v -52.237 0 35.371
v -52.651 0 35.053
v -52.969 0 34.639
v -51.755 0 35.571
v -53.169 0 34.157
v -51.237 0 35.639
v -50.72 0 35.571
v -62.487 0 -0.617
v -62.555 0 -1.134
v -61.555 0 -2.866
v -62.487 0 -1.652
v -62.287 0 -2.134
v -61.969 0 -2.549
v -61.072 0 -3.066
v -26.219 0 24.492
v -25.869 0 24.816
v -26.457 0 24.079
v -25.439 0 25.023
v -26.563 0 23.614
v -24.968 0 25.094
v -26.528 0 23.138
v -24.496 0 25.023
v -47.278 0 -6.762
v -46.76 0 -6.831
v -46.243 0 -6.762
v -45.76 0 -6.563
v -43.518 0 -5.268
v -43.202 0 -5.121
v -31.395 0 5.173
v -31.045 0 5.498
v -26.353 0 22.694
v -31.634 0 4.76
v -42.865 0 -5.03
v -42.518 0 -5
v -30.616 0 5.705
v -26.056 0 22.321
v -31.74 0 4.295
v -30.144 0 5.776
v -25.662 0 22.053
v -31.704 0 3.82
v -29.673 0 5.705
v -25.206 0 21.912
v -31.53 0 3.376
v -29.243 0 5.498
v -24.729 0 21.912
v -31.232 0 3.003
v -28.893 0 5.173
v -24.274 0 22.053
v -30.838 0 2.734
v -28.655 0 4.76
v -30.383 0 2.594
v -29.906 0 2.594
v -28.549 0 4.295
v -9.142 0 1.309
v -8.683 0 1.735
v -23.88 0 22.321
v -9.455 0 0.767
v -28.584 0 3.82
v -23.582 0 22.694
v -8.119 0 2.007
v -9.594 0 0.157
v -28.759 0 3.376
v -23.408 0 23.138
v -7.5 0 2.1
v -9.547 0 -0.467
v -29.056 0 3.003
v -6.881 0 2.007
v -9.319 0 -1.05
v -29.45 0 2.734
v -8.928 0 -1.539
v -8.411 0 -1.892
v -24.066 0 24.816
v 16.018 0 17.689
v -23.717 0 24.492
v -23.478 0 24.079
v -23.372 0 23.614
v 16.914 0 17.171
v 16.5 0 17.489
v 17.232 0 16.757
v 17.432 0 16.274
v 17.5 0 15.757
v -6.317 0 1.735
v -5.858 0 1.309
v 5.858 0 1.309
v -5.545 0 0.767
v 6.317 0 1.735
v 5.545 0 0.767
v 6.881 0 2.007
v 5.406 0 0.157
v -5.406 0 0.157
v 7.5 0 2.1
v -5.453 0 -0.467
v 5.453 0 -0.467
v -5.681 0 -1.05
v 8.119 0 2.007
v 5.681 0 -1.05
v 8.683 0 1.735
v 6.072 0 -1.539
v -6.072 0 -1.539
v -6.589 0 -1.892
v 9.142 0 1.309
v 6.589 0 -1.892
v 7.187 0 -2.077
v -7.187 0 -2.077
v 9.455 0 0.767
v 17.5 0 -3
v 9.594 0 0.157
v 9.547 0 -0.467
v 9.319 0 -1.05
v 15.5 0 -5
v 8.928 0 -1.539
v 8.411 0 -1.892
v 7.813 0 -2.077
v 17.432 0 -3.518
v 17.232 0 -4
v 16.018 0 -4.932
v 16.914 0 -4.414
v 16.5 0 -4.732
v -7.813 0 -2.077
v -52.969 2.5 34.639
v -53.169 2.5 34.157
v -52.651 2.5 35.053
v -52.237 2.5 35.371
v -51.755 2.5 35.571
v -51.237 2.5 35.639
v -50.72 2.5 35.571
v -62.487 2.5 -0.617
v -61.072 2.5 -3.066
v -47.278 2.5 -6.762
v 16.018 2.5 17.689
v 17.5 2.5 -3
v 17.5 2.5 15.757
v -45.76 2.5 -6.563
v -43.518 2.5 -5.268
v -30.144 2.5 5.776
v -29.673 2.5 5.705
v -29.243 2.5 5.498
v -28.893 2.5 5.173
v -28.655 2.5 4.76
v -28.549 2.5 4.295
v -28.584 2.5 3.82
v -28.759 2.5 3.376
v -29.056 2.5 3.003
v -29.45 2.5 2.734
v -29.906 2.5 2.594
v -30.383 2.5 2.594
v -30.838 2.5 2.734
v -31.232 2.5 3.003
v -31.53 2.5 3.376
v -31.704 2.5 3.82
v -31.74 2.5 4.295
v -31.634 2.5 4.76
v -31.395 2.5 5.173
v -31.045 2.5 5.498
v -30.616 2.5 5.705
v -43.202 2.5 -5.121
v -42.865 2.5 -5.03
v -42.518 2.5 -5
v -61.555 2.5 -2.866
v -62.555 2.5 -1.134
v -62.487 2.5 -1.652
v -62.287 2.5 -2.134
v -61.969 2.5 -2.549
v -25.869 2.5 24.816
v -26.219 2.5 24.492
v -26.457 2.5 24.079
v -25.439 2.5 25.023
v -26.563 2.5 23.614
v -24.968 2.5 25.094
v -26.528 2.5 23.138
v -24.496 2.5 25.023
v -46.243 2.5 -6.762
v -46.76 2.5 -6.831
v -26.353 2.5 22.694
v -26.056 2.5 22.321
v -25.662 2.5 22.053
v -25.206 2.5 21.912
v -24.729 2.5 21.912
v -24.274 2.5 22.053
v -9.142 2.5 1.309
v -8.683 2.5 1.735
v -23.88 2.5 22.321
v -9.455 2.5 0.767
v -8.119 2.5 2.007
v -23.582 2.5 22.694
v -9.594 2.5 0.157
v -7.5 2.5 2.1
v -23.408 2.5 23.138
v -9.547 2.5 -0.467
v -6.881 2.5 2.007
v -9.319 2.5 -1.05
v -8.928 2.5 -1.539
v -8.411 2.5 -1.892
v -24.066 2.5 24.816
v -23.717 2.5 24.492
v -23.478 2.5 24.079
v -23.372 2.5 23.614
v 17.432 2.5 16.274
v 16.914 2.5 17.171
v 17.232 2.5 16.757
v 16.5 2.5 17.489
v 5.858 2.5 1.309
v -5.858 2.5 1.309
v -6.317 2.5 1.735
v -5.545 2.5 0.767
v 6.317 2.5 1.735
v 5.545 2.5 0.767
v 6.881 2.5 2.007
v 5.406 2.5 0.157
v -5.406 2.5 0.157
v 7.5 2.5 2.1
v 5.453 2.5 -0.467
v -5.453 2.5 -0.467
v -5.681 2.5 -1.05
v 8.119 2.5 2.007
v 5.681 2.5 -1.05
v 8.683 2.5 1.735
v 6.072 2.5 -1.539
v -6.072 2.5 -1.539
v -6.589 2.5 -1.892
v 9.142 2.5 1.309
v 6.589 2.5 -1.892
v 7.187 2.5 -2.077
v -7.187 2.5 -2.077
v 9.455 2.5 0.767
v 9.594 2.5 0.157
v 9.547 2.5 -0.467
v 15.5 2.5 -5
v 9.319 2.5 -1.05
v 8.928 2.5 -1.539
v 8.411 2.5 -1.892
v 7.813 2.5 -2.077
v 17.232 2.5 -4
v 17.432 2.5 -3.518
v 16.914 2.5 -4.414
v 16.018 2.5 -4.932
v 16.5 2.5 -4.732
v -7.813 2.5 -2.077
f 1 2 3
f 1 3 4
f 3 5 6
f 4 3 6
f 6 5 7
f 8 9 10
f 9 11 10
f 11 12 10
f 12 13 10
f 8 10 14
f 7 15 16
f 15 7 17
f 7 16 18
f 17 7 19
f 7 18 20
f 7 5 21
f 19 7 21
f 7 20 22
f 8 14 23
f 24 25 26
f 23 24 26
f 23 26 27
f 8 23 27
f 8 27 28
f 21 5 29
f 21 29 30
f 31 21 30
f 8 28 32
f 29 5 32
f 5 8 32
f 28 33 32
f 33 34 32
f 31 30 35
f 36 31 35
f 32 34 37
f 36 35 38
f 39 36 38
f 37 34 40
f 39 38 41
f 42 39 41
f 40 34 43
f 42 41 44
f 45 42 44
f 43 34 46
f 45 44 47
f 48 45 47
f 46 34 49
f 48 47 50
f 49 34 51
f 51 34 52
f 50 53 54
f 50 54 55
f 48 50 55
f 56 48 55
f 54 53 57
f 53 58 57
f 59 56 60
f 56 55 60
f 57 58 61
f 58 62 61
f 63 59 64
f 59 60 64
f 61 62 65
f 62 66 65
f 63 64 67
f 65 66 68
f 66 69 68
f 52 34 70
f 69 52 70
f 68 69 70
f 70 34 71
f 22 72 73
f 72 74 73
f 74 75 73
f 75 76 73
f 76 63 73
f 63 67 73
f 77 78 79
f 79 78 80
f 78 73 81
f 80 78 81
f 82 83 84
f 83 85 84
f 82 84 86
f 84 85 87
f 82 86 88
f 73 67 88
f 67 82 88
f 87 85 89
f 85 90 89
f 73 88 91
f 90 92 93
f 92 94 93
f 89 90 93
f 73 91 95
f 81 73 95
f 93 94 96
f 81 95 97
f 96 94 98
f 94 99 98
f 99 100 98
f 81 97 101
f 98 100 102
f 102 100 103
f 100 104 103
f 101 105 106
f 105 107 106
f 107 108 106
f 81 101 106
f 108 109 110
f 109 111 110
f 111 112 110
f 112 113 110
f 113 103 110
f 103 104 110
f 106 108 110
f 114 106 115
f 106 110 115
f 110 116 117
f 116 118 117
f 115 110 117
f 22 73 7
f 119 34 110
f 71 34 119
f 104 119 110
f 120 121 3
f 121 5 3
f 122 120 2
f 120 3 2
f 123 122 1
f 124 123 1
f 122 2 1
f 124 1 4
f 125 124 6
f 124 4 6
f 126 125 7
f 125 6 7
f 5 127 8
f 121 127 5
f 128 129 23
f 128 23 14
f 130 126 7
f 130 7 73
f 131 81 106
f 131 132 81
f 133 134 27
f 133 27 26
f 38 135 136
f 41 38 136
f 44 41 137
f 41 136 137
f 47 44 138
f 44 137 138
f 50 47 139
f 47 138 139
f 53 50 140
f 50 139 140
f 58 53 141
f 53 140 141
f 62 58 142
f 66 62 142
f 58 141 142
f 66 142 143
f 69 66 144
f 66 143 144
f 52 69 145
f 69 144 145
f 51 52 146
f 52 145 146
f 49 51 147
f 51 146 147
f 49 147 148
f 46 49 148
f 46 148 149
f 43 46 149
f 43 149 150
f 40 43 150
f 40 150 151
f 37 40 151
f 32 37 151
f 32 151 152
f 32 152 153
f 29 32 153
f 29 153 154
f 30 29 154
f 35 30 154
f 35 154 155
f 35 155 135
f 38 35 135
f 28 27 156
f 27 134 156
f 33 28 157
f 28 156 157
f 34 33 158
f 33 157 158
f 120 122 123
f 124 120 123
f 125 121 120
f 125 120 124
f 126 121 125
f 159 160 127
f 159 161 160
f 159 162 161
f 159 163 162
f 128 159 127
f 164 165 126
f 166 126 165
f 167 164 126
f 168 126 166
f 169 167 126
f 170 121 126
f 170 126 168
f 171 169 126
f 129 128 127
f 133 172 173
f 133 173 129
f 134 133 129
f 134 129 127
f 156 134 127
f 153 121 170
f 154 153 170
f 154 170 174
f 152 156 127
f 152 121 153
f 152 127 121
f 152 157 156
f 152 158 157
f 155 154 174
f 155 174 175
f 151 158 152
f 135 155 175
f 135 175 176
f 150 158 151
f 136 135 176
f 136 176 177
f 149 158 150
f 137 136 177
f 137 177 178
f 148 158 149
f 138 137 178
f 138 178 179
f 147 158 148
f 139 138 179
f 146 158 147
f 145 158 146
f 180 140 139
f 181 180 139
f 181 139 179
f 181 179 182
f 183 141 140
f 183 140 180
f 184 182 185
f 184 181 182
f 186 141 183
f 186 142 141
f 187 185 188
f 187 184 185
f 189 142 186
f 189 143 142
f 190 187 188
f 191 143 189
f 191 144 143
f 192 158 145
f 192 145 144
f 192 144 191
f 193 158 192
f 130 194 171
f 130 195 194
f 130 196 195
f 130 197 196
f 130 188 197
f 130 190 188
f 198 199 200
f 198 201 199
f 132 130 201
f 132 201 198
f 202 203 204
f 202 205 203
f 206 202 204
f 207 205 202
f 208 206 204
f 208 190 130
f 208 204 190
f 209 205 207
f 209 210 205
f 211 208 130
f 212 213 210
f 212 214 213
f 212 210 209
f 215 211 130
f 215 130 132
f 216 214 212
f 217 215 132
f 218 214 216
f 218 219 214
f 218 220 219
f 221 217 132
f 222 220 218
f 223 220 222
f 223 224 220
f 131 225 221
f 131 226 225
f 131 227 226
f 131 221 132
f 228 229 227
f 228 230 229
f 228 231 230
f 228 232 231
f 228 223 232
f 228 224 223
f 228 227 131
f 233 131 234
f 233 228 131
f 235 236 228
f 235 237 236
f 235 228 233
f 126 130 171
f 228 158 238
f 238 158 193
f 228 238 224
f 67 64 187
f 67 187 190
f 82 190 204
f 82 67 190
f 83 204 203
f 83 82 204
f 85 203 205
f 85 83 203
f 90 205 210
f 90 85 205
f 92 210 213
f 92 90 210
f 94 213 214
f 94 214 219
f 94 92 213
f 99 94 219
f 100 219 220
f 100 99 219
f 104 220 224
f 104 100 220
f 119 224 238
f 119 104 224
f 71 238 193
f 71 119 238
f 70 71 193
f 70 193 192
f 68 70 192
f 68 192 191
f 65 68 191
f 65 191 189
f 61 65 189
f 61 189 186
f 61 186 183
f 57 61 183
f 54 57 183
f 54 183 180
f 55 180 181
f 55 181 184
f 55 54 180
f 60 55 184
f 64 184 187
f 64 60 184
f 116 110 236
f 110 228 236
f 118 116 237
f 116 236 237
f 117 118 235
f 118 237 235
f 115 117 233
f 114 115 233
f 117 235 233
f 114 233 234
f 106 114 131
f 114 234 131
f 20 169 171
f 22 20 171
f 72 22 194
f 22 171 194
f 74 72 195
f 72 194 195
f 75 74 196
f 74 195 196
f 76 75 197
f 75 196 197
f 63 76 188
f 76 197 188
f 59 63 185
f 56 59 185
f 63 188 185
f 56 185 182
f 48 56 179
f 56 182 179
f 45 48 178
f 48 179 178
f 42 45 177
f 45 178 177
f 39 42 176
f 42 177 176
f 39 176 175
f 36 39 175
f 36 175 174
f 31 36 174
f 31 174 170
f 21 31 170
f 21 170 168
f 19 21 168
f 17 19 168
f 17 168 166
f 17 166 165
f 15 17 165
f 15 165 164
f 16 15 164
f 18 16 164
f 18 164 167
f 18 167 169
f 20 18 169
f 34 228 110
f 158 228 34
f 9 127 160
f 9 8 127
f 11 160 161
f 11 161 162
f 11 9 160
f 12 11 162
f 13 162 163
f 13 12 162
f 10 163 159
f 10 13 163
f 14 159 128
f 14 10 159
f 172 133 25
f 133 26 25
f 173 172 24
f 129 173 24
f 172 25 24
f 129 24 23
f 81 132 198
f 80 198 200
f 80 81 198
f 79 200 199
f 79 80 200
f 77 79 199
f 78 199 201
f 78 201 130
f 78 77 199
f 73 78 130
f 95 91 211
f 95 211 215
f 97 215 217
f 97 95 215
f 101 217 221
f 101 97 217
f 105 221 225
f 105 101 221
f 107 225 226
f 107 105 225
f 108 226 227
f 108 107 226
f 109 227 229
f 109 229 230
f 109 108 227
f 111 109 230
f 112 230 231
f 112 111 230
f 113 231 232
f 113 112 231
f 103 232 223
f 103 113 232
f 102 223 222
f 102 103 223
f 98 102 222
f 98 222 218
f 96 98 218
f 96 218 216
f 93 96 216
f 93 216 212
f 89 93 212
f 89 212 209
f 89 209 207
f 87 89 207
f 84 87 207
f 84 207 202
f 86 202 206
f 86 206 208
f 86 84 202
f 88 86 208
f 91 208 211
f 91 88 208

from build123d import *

# Parameters (mm, degrees)
SKETCH_1_W          = 35
SKETCH_1_H          = 10
SKETCH_1_R          = 2.1
EXTRUDE_1_DEPTH     = 2.5
EXTRUDE_2_DEPTH     = 2.5
SKETCH_2_3_R        = 1.6
CUT_EXTRUDE_1_DEPTH = 73.650942584
CHAMFER_1_SIZE      = 24.494897428
CHAMFER_1_SIZE_2    = 30
FILLET_1_R          = 2


with BuildPart() as part:
    # 草图1 → 凸台-拉伸1 (new body)
    with BuildSketch(Plane(origin=(0, 0, 0), x_dir=(1, 0, 0), z_dir=(0, 1, 0))):
        Rectangle(SKETCH_1_W, SKETCH_1_H)
        with Locations(Location((-7.5, 0, 0), (0, 0, 270))):
            Circle(SKETCH_1_R, mode=Mode.SUBTRACT)
        with Locations(Location((7.5, 0, 0), (0, 0, 270))):
            Circle(SKETCH_1_R, mode=Mode.SUBTRACT)
    extrude(amount=EXTRUDE_1_DEPTH)

    # 草图2 → 凸台-拉伸2 (add)
    with BuildSketch(Plane(origin=(0, 2.5, 0), x_dir=(1, 0, 0), z_dir=(0, 1, 0))):
        Polygon((-63.004240202, 2.548597579), (-52.651478398, -36.088435473), (17.5, -17.291403488), (17.5, -5), (-17.5, -5), (-17.5, 14.741421993), align=None)
    extrude(amount=-EXTRUDE_2_DEPTH)

    # 草图2<3> → 切除-拉伸1 (cut, through all)
    with BuildSketch(Plane(origin=(0, 2.5, 0), x_dir=(1, 0, 0), z_dir=(0, 1, 0))):
        with Locations(Location((-30.144179737, -4.175718463, 0), (0, 0, 270))):
            Circle(SKETCH_2_3_R)
        with Locations(Location((-24.967798835, -23.494234988, 0), (0, 0, 270))):
            Circle(SKETCH_2_3_R)
    extrude(amount=-CUT_EXTRUDE_1_DEPTH, mode=Mode.SUBTRACT)

    # 倒角1
    # the kernel refuses this chamfer: 30, 24.494897428 mm, written as the material it takes off along each edge
    with BuildSketch(Plane(origin=(-17.5, 79.650489639, -14.741421993), x_dir=(0.04137655931612181, 0, 0.999143623479207), z_dir=(0, -1, 0))) as chamfer_1_piece_1_section:
        Polygon((CHAMFER_1_SIZE * 0.999143623472, CHAMFER_1_SIZE * 0.0413765593158), (CHAMFER_1_SIZE_2 * 0.218630711303, CHAMFER_1_SIZE_2 * 0.975807671662), (0, 0), align=None)
    chamfer_1_piece_1 = extrude(amount=156.800979278, mode=Mode.PRIVATE)
    chamfer_1_piece_1 = split(chamfer_1_piece_1, bisect_by=Plane(origin=(-28.937603514, 1.25, -5), z_dir=(0, 0, -1)), keep=Keep.TOP, mode=Mode.PRIVATE)
    add(chamfer_1_piece_1, mode=Mode.SUBTRACT)

    # 圆角1
    fillet_1_edges = [part.edges().sort_by_distance(p)[0] for p in [
        (17.5, 1.25, 17.291403488),
        (-52.651478398, 1.25, 36.088435473),
        (-63.004240202, 1.25, -2.548597579),
        (-46.477774789, 1.25, -6.97685064),
        (-43.053769041, 1.25, -5),
        (17.5, 1.25, -5),
    ]]
    fillet(fillet_1_edges, radius=FILLET_1_R)


solid = part.part
